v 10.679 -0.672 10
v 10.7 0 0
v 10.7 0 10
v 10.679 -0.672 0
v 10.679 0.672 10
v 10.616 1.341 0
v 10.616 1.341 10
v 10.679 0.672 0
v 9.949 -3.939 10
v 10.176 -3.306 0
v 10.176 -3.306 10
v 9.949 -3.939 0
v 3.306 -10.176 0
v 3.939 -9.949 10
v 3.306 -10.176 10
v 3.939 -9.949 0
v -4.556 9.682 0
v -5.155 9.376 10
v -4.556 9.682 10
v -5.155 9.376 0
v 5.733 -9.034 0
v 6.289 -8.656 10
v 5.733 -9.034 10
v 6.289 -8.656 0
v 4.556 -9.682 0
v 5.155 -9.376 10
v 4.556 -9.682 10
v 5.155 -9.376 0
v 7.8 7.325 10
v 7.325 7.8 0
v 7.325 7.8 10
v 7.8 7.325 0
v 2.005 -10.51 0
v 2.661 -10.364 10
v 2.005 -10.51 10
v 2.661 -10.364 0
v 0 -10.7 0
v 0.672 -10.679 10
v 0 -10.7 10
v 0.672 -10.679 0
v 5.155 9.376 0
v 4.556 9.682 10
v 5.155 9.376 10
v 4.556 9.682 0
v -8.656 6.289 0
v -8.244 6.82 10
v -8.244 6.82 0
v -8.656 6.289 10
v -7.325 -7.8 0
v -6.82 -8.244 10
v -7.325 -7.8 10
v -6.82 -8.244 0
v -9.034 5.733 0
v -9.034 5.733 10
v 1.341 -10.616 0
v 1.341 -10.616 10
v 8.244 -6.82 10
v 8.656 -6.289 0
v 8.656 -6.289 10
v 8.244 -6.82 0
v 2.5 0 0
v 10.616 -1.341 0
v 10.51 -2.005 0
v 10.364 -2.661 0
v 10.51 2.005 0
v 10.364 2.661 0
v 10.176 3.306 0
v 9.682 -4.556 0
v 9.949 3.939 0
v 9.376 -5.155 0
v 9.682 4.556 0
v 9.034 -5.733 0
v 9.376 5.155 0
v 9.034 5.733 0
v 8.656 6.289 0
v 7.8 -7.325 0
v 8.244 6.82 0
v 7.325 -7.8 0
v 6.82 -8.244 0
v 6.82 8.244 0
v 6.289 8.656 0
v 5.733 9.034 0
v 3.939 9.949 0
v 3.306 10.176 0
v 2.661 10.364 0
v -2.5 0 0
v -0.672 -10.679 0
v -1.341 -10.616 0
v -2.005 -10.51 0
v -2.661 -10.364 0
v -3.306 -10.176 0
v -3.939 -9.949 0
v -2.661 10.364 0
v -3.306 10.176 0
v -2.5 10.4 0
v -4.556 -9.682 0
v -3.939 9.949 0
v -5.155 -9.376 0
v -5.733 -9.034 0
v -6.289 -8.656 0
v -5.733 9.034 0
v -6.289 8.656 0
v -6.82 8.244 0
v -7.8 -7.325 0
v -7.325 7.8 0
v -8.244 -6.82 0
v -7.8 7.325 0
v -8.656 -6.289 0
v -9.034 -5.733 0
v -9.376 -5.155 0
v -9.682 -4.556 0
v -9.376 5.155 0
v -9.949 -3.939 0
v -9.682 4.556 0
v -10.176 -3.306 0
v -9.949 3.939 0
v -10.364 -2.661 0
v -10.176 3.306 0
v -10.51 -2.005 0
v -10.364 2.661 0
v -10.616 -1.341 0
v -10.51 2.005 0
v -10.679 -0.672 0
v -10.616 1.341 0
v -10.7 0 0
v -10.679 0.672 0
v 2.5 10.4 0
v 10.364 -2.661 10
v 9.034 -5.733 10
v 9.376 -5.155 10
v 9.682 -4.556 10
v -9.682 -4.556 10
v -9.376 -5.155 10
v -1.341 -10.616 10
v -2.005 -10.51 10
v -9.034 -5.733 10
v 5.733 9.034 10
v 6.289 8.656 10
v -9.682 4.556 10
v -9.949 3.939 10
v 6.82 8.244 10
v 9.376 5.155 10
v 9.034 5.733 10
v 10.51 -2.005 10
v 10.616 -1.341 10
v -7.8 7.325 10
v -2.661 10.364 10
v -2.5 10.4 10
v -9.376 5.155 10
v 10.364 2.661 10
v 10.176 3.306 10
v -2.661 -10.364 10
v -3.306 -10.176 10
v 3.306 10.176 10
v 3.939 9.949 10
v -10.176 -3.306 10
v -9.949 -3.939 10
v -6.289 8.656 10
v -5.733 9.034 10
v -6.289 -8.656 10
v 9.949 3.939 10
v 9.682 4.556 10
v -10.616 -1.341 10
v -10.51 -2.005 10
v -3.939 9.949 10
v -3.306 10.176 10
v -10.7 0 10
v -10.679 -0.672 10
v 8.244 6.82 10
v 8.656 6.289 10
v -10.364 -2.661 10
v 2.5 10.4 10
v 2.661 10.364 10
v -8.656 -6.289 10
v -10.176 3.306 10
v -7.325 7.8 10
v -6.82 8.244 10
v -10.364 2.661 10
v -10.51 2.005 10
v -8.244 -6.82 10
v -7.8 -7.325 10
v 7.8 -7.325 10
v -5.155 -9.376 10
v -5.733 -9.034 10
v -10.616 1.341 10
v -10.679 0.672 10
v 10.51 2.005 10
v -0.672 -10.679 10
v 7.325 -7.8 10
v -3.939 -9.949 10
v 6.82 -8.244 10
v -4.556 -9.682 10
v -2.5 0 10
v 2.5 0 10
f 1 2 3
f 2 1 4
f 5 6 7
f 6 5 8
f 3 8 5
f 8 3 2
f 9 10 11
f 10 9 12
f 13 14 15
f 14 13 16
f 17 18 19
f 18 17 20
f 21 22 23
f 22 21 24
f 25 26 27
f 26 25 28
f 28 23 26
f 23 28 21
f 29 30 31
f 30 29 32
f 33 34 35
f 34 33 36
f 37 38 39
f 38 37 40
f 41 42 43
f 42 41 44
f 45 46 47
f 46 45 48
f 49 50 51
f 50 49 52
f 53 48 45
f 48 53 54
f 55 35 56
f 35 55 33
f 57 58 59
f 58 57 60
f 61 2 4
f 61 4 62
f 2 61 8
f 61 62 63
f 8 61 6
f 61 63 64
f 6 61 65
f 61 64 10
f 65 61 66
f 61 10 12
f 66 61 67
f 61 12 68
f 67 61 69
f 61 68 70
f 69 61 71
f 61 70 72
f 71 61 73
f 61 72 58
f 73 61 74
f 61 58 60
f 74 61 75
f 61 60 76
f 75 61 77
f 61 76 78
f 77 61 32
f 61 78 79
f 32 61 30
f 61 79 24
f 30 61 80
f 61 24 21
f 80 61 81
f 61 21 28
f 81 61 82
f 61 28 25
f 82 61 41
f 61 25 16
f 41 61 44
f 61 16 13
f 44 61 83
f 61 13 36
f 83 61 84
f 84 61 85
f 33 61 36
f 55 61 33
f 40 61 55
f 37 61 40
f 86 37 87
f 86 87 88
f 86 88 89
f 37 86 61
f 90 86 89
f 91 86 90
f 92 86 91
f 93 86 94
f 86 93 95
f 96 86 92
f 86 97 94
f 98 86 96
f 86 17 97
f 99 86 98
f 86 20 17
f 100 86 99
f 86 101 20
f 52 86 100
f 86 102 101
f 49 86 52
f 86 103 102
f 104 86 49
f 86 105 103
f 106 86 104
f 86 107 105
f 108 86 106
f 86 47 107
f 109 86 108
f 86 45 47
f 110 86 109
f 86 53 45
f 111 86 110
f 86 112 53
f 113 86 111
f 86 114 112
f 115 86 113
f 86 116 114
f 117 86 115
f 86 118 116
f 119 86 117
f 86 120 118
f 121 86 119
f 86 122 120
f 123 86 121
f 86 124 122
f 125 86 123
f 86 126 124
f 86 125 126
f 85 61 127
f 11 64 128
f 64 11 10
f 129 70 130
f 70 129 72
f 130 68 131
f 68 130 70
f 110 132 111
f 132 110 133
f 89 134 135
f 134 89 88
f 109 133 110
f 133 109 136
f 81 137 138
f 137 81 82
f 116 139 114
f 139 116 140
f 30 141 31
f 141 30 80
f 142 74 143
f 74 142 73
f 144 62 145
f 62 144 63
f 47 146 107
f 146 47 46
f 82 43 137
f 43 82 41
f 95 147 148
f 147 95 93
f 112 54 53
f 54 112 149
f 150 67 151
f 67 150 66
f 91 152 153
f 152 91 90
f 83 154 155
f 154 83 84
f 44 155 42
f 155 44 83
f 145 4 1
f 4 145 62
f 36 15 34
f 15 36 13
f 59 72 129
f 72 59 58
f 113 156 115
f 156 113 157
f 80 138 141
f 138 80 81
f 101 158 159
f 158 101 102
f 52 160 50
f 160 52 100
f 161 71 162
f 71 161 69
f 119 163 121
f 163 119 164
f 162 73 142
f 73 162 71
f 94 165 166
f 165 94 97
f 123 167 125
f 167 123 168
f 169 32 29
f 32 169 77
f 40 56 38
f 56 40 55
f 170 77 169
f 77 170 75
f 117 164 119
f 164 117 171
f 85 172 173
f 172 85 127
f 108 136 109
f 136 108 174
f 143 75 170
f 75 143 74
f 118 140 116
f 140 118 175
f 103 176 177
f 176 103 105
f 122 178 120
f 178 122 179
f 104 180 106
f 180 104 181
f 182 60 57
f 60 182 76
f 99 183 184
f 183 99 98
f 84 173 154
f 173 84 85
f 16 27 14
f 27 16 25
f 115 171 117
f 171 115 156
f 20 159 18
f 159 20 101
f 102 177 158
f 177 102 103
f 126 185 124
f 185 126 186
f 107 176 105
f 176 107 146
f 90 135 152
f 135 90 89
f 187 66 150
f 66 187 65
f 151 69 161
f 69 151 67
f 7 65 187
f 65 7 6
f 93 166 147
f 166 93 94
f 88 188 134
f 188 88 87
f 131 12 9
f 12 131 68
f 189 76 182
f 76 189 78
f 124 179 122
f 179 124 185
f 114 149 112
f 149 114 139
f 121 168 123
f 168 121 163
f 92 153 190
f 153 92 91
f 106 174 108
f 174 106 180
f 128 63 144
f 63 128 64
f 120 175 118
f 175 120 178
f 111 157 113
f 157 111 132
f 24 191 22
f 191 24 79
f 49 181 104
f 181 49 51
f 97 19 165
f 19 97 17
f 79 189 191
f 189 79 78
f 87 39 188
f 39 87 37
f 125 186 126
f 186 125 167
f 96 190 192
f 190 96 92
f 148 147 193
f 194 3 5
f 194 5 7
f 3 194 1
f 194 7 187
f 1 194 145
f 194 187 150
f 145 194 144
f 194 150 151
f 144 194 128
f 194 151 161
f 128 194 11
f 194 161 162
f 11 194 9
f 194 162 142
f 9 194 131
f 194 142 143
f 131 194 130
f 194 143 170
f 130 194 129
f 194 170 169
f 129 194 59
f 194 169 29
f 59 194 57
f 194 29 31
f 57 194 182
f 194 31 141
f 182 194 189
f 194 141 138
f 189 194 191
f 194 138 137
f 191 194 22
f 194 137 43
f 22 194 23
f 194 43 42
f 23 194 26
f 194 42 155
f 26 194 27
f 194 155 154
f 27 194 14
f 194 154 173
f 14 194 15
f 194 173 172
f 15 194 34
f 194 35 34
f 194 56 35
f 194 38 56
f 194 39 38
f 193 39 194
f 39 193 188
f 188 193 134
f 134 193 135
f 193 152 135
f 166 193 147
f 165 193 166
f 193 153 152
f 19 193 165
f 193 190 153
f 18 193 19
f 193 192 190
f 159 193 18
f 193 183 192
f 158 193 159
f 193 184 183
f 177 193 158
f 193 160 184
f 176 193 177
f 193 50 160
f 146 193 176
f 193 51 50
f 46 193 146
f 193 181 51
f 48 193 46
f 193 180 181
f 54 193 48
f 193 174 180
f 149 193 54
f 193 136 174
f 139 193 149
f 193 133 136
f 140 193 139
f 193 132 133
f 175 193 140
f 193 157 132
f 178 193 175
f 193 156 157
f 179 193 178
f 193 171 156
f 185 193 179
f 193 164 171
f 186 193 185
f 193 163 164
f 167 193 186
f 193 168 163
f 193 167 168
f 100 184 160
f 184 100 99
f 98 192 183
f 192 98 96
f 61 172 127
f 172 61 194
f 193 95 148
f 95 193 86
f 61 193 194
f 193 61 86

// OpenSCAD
// file: ../configuration.scad
$fn=40; // model faces resolution.

//Parametry pro D01 a D02
//nastavení držáku na sloup
//----------------------------------------------------------------
//----------------------------------------------------------------
//není potřeba měnit
S01_prumer_vnitrni=40;
S01_tolerance_zavit=1.5;

S01_sila_materialu=1.3; //sila výtuhy

//D01 - uchyt velky
D01_material_pod_zavitem=5;
D01_material_za_zavitem=3;
D01_material_pred_zavitem=2;
D01_delka_tyce=30;
D01_sirka_tyce=15;

//D02 - uchyt na sloup
D02_sila_materialu=5;
D02_vyska_uchytky=40;
D02_prumer_obruby=32; 
//27mm - 3/4 trubka
D02_delka_celeho_uchytu=60;
D02_dotahova_vzdalenost=1.5;
D02_prumer_uchytneho_sroubu=4.2;
D02_sirka_matky=9.1; //pro M4
D02_vyska_matky=3;


D05_vyska_drzaku_senzoru=15;
D05_prumer_zkumavky_vnitrni=21.4;
D05_vyska_podstavce=10;
D05_sirka_otvoru_na_kabel=5;
// main file
$fn=40; // model faces resolution.
include <../configuration.scad>


//Ucpávka
module ISLHOLDER01A_D06()
    {
  
            
   difference()
        {         
        cylinder (h = D05_vyska_podstavce, r=D05_prumer_zkumavky_vnitrni/2, $fn=100);
        
        translate([0,D05_prumer_zkumavky_vnitrni/4,D05_vyska_podstavce/2])  
            cube([D05_sirka_otvoru_na_kabel,D05_prumer_zkumavky_vnitrni/2,D05_vyska_podstavce+0.11],true); 
         
        
       }
    }

ISLHOLDER01A_D06();
